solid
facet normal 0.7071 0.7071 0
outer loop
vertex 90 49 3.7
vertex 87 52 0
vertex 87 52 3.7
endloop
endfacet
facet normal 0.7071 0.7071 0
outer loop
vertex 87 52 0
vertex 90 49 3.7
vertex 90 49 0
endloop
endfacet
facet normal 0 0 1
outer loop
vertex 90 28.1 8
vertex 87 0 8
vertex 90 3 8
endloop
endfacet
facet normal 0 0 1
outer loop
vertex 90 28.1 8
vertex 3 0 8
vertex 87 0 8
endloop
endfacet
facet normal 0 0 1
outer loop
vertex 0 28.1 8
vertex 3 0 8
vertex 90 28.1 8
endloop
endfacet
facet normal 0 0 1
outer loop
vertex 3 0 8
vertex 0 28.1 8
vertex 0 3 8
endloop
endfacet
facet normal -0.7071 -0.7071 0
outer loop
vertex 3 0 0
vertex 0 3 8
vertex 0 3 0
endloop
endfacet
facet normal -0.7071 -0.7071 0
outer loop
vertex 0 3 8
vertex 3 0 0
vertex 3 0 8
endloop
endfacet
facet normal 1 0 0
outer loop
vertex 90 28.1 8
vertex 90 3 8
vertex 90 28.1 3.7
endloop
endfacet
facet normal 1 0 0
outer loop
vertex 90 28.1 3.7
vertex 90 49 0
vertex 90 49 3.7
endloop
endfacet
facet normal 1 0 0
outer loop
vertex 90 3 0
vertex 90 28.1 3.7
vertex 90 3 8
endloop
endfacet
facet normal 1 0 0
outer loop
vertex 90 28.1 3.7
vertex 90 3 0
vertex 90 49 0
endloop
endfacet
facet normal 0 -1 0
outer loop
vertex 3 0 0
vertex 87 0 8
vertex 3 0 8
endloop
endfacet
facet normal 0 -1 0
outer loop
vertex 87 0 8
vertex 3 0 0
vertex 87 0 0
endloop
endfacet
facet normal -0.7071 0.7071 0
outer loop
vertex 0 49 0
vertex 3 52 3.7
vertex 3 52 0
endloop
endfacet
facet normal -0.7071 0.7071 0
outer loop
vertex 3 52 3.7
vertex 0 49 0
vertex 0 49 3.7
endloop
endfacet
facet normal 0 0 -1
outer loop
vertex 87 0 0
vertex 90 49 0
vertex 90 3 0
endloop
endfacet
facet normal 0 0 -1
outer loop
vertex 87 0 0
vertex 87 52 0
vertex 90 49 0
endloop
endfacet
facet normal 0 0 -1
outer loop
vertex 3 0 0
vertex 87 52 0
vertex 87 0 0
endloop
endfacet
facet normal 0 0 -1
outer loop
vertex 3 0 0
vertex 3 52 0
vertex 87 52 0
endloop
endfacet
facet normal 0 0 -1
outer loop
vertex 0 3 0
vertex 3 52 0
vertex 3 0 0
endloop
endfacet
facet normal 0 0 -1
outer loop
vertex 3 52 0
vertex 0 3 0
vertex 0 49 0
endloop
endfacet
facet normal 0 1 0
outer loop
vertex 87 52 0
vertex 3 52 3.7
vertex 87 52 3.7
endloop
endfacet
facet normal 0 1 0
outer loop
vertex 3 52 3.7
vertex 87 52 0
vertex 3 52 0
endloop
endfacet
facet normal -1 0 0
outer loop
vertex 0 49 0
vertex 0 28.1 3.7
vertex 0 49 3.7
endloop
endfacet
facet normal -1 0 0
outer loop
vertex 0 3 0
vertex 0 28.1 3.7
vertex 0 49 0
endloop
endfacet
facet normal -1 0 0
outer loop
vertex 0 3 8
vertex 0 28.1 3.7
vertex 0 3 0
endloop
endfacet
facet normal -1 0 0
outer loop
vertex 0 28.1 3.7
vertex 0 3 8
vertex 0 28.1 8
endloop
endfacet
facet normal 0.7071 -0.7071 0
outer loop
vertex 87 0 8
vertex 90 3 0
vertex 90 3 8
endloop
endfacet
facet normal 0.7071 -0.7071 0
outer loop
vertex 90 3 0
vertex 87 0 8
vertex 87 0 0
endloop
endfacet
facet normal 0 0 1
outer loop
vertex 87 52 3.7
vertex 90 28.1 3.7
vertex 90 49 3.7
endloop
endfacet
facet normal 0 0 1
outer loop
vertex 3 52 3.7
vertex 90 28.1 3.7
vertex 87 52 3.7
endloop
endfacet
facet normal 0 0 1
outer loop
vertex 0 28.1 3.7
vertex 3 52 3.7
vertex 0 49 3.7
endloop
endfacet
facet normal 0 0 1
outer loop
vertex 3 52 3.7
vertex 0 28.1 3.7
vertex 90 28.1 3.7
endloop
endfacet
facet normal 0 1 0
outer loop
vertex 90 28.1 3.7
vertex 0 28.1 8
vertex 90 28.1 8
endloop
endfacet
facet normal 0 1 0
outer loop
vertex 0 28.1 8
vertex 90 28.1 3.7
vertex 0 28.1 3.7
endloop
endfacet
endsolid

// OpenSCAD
$fn = 32;

// ----------------------------------------------------------------------
// Stepped bar: sidestep, 90 x 52 x 8/3.7 mm
// ----------------------------------------------------------------------

// --- parameters (mm) ---
bar_l = 90;               // bar length, X
bar_w = 52;               // bar width, Y
plate_t = 8;              // thickness of the thick zone, Z
thin_t = 3.7;             // thickness of the thin zone
corner_c = 3;             // corner chamfer of the bar
step_cut = 4.3;           // material removed from the thin zone
ledge_y = 28.1;           // start of the ledge from the front edge
depth_1 = 4.3;            // depth of cut 1 from the top face
fit_tol = 0.05;           // declared fit tolerance (prompt contract)
free_tol = 0.3;           // declared free tolerance (prompt contract)

profile = [[3, 0], [87, 0], [90, 3], [90, 49], [87, 52], [3, 52], [0, 49], [0, 3]];  // primary outline, 8 points, counter clockwise
void_1 = [[-1, 28.1], [91, 28.1], [91, 53], [-1, 53]];  // ledge cut along one edge, 4 points

// --- the one profile operation ---
difference() {
  linear_extrude(height = plate_t) polygon(points = profile);
  translate([0, 0, plate_t - depth_1])
    linear_extrude(height = depth_1 + 1) polygon(points = void_1);
}
